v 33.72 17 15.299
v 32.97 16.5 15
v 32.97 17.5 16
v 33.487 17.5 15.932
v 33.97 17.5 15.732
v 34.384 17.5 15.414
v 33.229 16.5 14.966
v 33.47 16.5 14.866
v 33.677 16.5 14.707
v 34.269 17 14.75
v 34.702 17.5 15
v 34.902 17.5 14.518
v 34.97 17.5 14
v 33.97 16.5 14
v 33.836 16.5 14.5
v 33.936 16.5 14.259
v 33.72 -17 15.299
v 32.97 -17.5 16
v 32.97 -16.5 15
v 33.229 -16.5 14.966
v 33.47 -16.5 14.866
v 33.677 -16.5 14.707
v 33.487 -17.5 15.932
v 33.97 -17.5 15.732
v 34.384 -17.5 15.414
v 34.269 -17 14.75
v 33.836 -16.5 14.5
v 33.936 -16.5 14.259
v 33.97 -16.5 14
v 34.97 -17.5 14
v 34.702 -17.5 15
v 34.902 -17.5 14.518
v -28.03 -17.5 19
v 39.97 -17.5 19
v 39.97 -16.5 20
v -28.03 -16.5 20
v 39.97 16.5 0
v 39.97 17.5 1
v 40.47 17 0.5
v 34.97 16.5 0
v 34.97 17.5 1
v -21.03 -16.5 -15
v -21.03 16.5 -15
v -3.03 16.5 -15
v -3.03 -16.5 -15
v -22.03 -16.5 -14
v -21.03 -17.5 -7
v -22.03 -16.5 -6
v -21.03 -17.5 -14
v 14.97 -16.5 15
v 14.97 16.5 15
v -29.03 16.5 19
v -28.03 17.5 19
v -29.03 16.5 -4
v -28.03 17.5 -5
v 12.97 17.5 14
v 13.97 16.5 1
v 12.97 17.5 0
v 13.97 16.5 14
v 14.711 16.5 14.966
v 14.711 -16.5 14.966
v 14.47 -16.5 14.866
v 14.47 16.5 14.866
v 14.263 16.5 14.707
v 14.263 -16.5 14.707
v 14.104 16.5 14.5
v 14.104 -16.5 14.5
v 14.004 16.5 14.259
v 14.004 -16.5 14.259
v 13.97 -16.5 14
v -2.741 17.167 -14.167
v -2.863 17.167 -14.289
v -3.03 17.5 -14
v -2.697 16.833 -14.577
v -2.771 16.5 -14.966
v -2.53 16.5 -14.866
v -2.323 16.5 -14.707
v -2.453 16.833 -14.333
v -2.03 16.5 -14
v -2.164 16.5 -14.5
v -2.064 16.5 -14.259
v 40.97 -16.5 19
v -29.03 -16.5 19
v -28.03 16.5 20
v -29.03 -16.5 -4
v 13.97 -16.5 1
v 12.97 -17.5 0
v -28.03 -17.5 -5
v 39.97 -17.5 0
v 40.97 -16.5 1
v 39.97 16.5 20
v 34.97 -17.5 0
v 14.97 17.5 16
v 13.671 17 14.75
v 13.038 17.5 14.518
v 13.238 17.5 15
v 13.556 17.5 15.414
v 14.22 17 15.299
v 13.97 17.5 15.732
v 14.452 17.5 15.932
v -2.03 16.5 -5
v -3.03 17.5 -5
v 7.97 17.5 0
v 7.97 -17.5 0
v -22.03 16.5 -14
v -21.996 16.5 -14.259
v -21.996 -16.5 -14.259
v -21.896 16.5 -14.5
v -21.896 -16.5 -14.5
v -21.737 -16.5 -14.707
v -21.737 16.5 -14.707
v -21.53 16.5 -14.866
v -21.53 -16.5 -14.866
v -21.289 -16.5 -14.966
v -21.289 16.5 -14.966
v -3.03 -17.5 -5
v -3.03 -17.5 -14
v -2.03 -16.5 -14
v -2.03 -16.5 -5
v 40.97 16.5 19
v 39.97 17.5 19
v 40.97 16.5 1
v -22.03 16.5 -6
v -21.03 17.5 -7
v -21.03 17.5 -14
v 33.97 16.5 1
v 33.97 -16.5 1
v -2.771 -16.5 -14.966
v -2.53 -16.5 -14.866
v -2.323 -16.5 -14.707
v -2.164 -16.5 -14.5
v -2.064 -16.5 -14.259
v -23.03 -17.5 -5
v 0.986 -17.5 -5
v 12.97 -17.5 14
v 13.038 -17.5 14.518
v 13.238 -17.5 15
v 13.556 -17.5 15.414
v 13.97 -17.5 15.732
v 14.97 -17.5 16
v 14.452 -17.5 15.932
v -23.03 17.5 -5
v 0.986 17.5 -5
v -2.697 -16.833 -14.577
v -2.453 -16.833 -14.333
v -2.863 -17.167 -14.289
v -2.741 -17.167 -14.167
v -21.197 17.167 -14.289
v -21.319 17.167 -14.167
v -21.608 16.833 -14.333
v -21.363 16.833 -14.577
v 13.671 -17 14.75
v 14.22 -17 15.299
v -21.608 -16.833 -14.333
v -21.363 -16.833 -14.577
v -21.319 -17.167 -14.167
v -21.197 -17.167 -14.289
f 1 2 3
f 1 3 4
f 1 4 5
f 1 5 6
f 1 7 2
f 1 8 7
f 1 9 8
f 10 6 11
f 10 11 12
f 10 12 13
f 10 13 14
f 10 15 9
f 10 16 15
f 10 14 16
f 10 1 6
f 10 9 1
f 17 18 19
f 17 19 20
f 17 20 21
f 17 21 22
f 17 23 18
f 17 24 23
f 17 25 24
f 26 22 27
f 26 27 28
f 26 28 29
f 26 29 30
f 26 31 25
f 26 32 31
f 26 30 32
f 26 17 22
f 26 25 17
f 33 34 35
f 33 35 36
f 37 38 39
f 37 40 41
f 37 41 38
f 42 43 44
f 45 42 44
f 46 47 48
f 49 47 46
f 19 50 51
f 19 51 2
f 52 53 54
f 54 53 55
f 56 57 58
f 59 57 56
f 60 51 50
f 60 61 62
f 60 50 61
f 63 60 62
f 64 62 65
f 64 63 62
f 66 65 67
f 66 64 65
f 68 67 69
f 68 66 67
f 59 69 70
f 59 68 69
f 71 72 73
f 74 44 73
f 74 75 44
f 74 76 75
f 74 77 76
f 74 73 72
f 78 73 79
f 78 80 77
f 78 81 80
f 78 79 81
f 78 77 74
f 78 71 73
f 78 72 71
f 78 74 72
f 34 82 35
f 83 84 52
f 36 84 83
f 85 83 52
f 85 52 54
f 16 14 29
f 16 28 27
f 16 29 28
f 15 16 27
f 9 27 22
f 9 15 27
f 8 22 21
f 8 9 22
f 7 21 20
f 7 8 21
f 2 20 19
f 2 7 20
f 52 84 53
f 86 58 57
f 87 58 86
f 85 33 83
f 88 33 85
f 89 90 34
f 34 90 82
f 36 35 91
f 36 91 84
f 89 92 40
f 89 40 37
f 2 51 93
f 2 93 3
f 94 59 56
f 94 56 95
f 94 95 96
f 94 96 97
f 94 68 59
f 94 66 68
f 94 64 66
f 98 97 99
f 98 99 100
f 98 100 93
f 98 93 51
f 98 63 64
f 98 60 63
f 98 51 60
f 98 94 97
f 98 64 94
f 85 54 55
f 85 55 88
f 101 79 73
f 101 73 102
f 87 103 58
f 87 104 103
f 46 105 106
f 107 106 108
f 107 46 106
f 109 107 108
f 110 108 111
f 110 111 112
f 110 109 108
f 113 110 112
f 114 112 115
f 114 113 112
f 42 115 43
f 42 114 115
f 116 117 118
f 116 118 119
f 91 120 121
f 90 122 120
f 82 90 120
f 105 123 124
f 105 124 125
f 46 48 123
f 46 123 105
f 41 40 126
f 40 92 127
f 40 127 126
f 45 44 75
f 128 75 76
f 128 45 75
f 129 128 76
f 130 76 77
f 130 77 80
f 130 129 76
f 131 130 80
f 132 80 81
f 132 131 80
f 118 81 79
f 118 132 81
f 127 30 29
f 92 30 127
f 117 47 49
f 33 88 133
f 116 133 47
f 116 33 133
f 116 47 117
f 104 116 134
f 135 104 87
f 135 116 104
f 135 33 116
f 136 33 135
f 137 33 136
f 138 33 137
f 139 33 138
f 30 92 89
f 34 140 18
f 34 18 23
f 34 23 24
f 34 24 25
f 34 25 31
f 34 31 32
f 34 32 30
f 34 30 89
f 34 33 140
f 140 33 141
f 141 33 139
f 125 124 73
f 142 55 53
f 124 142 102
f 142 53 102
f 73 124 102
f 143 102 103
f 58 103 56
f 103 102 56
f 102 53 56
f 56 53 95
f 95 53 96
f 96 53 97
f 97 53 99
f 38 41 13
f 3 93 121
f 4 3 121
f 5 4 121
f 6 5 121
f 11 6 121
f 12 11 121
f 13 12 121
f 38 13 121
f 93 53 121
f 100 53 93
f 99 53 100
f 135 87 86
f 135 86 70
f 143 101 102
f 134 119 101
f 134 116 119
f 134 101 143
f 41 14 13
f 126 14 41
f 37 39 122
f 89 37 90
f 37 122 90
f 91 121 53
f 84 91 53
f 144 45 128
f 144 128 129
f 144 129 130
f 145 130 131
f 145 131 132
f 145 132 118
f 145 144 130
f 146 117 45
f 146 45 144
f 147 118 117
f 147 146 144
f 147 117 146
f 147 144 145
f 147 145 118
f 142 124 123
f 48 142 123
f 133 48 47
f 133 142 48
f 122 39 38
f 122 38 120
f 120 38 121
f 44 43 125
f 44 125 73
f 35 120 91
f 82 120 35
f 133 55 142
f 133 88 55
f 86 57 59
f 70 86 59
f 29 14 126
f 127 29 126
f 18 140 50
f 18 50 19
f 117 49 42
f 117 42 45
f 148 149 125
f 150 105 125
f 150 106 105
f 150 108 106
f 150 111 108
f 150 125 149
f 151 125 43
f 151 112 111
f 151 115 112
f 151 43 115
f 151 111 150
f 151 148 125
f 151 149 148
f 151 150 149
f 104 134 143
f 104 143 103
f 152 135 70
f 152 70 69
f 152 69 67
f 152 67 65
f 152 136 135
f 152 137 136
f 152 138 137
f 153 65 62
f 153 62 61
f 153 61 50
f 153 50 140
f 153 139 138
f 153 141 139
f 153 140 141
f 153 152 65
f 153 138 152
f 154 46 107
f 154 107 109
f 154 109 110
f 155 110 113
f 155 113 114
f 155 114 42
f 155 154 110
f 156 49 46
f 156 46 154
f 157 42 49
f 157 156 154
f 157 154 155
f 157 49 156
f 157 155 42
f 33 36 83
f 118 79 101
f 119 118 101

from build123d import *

# Parameters (mm, degrees)
F1_DEPTH = 17.5
F2_SIZE  = 1
F3_R     = 1
F4_SIZE  = 1


with BuildPart() as f1:
    # F0 (on Front) → F1 (new body, symmetric)
    with BuildSketch(Plane.XZ):
        Polygon((33.969838, 0), (40.969838, 0), (40.969838, 20), (-29.030162, 20), (-29.030162, -5), (-22.030162, -5), (-22.030162, -15), (-2.030162, -15), (-2.030162, -5), (0.98608, -5), (7.969838, 0), (13.969838, 0), (13.969838, 15), (33.969838, 15), align=None)
    extrude(amount=F1_DEPTH, both=True)

    # F2
    f2_edges = [f1.edges().sort_by_distance(p)[0] for p in [
        (40.969838, 0, 0),
        (40.969838, -17.5, 10),
        (40.969838, 0, 20),
        (40.969838, 17.5, 10),
        (5.969838, -17.5, 20),
        (5.969838, 17.5, 20),
        (-29.030162, 0, 20),
        (-29.030162, -17.5, 7.5),
        (-29.030162, 17.5, 7.5),
        (-29.030162, 0, -5),
        (-22.030162, 0, -5),
    ]]
    chamfer(f2_edges, length=F2_SIZE)

    # F3
    f3_edges = [f1.edges().sort_by_distance(p)[0] for p in [
        (-22.030162, 0, -15),
        (-2.030162, 0, -15),
        (13.969838, 0, 15),
        (33.969838, 0, 15),
    ]]
    fillet(f3_edges, radius=F3_R)

    # F4
    f4_edges = [f1.edges().sort_by_distance(p)[0] for p in [
        (33.969838, 0, 0),
        (36.969838, 17.5, 0),
        (13.969838, 0, 0),
        (23.969838, -17.5, 15),
        (23.969838, 17.5, 15),
        (-12.030162, 17.5, -15),
        (-12.030162, -17.5, -15),
    ]]
    chamfer(f4_edges, length=F4_SIZE)


solid = f1.part
